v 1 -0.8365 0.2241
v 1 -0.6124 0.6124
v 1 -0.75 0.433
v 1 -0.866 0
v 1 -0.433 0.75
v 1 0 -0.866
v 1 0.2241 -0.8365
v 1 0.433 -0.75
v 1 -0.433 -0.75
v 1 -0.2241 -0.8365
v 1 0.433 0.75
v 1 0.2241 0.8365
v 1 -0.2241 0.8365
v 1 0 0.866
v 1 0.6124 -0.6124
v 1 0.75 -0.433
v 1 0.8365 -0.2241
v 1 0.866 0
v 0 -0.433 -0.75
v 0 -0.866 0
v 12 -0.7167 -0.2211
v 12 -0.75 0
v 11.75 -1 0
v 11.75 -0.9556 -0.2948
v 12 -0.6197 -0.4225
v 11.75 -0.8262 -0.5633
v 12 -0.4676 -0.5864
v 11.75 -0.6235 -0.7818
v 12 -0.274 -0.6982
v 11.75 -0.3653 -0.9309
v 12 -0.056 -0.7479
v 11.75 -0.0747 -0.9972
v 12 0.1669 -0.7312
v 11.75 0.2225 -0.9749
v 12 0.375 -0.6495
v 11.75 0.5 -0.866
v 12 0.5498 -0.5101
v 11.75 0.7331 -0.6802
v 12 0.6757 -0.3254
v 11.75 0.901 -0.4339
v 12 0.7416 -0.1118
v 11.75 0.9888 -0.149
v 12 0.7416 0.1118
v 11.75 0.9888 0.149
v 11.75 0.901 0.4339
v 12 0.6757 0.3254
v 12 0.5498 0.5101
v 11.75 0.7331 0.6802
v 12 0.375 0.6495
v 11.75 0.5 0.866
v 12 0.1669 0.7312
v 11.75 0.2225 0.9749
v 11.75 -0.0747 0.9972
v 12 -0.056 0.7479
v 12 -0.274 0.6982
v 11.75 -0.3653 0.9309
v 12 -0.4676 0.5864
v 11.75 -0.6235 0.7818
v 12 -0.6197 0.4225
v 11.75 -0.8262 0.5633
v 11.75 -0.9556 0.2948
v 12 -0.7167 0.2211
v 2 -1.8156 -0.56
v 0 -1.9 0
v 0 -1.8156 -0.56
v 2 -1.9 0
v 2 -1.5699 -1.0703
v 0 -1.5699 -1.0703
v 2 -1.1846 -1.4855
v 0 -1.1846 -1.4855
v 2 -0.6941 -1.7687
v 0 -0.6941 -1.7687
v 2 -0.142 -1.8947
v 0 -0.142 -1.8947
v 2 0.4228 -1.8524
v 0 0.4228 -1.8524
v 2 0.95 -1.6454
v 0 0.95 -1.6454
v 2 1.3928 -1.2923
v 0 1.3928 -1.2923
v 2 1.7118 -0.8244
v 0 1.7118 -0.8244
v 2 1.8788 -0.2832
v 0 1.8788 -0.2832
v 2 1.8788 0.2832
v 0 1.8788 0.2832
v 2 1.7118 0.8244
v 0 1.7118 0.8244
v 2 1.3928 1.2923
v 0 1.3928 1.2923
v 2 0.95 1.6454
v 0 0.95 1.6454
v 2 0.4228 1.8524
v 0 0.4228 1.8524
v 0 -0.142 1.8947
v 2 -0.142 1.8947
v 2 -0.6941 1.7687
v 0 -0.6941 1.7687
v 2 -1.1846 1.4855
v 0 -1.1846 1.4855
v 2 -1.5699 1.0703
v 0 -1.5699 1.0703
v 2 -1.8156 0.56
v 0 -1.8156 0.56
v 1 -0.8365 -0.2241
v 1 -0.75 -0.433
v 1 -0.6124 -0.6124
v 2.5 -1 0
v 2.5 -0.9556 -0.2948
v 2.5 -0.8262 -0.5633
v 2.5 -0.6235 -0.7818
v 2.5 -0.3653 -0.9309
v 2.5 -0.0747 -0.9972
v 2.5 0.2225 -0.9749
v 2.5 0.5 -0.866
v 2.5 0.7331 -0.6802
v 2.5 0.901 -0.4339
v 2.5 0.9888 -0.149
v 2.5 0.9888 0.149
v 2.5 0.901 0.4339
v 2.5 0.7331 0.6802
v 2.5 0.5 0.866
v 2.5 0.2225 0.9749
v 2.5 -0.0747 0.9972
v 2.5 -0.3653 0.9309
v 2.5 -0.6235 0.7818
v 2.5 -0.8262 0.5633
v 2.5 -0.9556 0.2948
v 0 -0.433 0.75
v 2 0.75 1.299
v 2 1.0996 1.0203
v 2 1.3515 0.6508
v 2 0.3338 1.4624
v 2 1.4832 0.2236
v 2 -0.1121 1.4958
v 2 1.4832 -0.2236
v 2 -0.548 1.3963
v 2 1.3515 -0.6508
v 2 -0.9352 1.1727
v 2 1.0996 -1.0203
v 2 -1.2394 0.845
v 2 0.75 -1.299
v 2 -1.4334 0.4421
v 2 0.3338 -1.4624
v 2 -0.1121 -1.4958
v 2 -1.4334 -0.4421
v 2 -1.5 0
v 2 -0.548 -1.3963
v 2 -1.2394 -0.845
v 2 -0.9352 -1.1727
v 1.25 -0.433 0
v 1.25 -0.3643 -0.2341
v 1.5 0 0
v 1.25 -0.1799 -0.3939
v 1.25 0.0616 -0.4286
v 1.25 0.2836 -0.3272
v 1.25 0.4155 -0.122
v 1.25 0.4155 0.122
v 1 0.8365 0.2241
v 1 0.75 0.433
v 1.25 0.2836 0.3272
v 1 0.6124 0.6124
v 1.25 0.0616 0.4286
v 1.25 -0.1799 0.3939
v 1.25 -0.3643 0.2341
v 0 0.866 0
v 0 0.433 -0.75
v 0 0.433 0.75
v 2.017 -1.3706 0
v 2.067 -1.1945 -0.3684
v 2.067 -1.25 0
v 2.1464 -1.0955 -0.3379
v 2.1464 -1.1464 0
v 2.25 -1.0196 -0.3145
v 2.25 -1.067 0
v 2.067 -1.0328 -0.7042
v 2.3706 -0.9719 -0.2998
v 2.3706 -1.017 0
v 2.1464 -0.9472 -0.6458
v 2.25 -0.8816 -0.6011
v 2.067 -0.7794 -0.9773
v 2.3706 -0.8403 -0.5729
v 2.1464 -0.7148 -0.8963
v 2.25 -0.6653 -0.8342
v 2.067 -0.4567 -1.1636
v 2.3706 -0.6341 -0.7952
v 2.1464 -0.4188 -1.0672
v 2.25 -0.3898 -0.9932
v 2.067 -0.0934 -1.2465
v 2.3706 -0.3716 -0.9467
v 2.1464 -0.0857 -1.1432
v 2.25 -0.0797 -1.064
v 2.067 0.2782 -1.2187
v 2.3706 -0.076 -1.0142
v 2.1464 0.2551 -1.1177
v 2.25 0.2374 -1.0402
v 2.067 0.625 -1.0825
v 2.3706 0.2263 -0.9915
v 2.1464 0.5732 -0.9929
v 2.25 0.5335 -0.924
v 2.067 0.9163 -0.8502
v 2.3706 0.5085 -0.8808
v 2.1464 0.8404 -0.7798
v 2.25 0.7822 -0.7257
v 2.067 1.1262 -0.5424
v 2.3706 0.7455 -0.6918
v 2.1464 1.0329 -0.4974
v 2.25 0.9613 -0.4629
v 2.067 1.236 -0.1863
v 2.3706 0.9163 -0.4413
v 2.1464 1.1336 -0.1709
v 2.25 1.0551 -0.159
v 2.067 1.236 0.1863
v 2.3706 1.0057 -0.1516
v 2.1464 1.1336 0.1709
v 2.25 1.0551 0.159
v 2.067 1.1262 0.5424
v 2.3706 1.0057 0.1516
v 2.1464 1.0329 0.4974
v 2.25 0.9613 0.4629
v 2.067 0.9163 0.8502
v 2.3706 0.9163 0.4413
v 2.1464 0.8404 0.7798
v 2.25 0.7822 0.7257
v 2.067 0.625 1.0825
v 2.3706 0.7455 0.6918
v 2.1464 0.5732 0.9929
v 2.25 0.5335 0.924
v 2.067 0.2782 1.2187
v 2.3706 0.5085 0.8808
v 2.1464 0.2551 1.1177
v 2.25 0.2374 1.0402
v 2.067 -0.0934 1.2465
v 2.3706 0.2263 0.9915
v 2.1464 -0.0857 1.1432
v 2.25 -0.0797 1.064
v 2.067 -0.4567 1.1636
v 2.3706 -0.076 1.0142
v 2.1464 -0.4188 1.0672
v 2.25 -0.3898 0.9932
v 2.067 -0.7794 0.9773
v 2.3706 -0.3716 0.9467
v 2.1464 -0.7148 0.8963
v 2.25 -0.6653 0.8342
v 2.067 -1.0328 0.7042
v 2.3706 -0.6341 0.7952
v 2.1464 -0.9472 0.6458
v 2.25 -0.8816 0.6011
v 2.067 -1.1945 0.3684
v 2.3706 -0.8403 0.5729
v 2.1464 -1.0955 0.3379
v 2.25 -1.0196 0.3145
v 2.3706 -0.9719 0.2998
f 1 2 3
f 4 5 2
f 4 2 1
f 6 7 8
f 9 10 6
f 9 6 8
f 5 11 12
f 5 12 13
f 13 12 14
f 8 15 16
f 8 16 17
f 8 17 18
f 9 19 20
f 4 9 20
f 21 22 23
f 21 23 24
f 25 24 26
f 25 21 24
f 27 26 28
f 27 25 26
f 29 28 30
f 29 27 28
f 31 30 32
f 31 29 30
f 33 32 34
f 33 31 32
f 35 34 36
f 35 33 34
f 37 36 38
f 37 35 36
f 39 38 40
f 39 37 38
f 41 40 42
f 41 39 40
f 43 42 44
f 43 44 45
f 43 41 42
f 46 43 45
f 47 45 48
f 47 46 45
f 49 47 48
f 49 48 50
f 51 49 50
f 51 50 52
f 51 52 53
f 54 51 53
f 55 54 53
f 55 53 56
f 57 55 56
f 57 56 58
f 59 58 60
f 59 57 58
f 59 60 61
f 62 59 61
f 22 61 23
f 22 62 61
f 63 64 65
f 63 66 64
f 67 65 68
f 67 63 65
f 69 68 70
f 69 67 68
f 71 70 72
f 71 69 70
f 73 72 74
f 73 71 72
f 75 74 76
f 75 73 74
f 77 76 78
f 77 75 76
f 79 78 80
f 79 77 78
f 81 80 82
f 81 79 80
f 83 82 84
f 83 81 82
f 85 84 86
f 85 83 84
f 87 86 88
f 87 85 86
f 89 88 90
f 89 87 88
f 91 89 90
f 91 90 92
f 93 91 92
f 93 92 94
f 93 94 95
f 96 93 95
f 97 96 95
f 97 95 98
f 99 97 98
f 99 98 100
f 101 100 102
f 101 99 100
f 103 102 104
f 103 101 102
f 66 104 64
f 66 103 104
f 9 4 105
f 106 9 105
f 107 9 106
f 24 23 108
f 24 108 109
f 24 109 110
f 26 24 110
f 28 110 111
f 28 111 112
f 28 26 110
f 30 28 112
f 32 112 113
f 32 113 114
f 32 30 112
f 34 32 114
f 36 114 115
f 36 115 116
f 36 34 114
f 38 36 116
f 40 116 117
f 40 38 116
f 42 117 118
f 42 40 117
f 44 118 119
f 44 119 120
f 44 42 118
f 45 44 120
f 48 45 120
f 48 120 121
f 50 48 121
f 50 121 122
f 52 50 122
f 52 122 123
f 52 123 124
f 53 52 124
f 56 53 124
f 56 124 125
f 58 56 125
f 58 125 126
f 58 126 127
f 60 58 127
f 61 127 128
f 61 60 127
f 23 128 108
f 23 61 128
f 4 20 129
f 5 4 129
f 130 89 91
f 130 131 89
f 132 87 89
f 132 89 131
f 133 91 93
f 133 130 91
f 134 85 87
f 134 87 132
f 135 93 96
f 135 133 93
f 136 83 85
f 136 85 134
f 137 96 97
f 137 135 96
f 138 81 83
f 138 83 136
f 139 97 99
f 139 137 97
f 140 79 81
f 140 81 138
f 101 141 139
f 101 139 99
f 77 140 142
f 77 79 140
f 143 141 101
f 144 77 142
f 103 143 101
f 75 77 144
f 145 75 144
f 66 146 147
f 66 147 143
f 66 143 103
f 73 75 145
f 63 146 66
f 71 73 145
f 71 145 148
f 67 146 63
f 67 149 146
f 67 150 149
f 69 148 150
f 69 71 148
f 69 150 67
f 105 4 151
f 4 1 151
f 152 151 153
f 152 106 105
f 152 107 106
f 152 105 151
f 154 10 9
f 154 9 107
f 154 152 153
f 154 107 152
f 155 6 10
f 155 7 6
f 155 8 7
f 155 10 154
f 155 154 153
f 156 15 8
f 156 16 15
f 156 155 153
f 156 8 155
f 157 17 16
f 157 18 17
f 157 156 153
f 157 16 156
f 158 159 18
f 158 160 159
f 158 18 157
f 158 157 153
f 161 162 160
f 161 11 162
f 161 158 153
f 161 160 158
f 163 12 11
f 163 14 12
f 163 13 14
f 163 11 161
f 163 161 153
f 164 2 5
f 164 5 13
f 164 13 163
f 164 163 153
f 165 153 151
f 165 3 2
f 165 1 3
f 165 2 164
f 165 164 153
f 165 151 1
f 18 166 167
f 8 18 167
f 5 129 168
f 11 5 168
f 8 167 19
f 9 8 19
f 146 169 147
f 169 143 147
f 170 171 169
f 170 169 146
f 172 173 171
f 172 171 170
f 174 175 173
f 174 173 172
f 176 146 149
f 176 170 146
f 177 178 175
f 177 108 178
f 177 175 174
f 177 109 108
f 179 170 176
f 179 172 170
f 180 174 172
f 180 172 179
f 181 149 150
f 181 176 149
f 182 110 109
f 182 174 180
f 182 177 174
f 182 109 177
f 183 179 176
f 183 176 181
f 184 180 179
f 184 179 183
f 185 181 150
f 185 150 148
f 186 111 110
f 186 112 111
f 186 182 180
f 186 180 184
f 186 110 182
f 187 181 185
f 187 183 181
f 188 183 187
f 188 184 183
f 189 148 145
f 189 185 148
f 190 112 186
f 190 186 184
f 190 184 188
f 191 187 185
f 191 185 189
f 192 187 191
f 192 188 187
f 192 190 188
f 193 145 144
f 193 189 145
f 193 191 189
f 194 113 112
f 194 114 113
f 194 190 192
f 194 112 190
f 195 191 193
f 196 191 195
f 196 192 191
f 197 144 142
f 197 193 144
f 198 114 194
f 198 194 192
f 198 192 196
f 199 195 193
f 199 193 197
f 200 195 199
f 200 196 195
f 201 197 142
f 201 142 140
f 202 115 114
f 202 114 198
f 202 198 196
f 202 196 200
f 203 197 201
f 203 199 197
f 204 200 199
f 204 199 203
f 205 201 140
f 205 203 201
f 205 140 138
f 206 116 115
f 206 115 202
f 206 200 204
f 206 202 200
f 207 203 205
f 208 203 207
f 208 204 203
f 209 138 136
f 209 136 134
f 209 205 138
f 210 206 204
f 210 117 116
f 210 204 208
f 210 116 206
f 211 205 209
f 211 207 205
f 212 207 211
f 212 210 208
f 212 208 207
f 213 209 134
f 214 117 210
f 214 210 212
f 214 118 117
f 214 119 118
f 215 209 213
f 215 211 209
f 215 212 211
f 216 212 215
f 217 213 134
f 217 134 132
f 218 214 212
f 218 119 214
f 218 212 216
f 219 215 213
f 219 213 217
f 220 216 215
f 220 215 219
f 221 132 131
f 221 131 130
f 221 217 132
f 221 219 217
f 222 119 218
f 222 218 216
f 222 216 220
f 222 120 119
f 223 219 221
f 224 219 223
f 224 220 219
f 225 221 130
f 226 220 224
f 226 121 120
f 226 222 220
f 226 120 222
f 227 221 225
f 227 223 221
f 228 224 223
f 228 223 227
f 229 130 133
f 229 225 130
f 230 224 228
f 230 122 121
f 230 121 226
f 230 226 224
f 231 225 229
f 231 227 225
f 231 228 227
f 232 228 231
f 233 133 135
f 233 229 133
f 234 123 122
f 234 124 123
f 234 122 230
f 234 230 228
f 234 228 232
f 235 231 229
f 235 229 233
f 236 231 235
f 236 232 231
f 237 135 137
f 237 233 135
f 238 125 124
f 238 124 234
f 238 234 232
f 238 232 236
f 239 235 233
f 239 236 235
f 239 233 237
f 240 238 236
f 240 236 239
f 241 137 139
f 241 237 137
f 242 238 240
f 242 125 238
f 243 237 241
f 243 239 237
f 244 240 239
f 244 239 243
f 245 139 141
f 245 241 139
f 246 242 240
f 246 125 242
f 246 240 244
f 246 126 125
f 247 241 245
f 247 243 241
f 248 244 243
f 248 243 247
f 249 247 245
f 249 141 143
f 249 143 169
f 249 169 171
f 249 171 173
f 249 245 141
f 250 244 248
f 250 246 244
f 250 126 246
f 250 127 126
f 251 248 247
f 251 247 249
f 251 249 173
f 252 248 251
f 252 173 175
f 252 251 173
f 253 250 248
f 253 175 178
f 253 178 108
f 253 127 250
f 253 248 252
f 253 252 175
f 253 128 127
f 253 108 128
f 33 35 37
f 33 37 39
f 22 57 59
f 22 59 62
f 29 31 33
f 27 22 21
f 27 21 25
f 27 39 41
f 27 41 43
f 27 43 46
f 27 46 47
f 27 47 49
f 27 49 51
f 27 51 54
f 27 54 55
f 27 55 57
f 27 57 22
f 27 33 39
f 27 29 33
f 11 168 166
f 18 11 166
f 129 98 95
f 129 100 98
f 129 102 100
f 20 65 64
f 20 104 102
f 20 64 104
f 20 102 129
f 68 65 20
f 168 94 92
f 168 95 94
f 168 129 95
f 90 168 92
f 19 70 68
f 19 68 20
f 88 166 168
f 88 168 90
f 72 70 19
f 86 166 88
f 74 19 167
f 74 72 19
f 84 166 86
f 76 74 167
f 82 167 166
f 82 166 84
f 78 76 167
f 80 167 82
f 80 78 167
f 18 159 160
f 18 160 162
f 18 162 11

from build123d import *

# Parameters (mm, degrees)
FILLET_1_R          = 0.5
CUT_EXTRUDE_2_DEPTH = 1
CHAMFER_3_SIZE      = 0.25


with BuildPart() as part:
    # Эскиз2 → Повернуть1 (revolve)
    with BuildSketch(Plane.XY):
        Polygon((0, 0), (0, -1.9), (2, -1.9), (2, -1), (12, -1), (12, 0), align=None)
    revolve(axis=Axis((0, 0, 0), (1, 0, 0)))

    # Скругление1
    fillet_1_edges = [part.edges().sort_by_distance(p)[0] for p in [
        (2, 1, 0),
    ]]
    fillet(fillet_1_edges, radius=FILLET_1_R)

    # Эскиз3 → Вырез-Вытянуть2 (cut)
    with BuildSketch(Plane.ZY):
        Polygon((0, 0.866025404), (-0.75, 0.433012702), (-0.75, -0.433012702), (0, -0.866025404), (0.75, -0.433012702), (0.75, 0.433012702), align=None)
    extrude(amount=-CUT_EXTRUDE_2_DEPTH, mode=Mode.SUBTRACT)

    # Эскиз5 → Вырез-Повернуть1 (revolve, cut)
    with BuildSketch(Plane.XY):
        Polygon((1, -0.866025404), (1, 0), (1.5, 0), align=None)
    revolve(axis=Axis((1, 0, 0), (1, 0, 0)), mode=Mode.SUBTRACT)

    # Фаска3
    chamfer_3_edges = [part.edges().sort_by_distance(p)[0] for p in [
        (12, 1, 0),
    ]]
    chamfer(chamfer_3_edges, length=CHAMFER_3_SIZE)


solid = part.part
